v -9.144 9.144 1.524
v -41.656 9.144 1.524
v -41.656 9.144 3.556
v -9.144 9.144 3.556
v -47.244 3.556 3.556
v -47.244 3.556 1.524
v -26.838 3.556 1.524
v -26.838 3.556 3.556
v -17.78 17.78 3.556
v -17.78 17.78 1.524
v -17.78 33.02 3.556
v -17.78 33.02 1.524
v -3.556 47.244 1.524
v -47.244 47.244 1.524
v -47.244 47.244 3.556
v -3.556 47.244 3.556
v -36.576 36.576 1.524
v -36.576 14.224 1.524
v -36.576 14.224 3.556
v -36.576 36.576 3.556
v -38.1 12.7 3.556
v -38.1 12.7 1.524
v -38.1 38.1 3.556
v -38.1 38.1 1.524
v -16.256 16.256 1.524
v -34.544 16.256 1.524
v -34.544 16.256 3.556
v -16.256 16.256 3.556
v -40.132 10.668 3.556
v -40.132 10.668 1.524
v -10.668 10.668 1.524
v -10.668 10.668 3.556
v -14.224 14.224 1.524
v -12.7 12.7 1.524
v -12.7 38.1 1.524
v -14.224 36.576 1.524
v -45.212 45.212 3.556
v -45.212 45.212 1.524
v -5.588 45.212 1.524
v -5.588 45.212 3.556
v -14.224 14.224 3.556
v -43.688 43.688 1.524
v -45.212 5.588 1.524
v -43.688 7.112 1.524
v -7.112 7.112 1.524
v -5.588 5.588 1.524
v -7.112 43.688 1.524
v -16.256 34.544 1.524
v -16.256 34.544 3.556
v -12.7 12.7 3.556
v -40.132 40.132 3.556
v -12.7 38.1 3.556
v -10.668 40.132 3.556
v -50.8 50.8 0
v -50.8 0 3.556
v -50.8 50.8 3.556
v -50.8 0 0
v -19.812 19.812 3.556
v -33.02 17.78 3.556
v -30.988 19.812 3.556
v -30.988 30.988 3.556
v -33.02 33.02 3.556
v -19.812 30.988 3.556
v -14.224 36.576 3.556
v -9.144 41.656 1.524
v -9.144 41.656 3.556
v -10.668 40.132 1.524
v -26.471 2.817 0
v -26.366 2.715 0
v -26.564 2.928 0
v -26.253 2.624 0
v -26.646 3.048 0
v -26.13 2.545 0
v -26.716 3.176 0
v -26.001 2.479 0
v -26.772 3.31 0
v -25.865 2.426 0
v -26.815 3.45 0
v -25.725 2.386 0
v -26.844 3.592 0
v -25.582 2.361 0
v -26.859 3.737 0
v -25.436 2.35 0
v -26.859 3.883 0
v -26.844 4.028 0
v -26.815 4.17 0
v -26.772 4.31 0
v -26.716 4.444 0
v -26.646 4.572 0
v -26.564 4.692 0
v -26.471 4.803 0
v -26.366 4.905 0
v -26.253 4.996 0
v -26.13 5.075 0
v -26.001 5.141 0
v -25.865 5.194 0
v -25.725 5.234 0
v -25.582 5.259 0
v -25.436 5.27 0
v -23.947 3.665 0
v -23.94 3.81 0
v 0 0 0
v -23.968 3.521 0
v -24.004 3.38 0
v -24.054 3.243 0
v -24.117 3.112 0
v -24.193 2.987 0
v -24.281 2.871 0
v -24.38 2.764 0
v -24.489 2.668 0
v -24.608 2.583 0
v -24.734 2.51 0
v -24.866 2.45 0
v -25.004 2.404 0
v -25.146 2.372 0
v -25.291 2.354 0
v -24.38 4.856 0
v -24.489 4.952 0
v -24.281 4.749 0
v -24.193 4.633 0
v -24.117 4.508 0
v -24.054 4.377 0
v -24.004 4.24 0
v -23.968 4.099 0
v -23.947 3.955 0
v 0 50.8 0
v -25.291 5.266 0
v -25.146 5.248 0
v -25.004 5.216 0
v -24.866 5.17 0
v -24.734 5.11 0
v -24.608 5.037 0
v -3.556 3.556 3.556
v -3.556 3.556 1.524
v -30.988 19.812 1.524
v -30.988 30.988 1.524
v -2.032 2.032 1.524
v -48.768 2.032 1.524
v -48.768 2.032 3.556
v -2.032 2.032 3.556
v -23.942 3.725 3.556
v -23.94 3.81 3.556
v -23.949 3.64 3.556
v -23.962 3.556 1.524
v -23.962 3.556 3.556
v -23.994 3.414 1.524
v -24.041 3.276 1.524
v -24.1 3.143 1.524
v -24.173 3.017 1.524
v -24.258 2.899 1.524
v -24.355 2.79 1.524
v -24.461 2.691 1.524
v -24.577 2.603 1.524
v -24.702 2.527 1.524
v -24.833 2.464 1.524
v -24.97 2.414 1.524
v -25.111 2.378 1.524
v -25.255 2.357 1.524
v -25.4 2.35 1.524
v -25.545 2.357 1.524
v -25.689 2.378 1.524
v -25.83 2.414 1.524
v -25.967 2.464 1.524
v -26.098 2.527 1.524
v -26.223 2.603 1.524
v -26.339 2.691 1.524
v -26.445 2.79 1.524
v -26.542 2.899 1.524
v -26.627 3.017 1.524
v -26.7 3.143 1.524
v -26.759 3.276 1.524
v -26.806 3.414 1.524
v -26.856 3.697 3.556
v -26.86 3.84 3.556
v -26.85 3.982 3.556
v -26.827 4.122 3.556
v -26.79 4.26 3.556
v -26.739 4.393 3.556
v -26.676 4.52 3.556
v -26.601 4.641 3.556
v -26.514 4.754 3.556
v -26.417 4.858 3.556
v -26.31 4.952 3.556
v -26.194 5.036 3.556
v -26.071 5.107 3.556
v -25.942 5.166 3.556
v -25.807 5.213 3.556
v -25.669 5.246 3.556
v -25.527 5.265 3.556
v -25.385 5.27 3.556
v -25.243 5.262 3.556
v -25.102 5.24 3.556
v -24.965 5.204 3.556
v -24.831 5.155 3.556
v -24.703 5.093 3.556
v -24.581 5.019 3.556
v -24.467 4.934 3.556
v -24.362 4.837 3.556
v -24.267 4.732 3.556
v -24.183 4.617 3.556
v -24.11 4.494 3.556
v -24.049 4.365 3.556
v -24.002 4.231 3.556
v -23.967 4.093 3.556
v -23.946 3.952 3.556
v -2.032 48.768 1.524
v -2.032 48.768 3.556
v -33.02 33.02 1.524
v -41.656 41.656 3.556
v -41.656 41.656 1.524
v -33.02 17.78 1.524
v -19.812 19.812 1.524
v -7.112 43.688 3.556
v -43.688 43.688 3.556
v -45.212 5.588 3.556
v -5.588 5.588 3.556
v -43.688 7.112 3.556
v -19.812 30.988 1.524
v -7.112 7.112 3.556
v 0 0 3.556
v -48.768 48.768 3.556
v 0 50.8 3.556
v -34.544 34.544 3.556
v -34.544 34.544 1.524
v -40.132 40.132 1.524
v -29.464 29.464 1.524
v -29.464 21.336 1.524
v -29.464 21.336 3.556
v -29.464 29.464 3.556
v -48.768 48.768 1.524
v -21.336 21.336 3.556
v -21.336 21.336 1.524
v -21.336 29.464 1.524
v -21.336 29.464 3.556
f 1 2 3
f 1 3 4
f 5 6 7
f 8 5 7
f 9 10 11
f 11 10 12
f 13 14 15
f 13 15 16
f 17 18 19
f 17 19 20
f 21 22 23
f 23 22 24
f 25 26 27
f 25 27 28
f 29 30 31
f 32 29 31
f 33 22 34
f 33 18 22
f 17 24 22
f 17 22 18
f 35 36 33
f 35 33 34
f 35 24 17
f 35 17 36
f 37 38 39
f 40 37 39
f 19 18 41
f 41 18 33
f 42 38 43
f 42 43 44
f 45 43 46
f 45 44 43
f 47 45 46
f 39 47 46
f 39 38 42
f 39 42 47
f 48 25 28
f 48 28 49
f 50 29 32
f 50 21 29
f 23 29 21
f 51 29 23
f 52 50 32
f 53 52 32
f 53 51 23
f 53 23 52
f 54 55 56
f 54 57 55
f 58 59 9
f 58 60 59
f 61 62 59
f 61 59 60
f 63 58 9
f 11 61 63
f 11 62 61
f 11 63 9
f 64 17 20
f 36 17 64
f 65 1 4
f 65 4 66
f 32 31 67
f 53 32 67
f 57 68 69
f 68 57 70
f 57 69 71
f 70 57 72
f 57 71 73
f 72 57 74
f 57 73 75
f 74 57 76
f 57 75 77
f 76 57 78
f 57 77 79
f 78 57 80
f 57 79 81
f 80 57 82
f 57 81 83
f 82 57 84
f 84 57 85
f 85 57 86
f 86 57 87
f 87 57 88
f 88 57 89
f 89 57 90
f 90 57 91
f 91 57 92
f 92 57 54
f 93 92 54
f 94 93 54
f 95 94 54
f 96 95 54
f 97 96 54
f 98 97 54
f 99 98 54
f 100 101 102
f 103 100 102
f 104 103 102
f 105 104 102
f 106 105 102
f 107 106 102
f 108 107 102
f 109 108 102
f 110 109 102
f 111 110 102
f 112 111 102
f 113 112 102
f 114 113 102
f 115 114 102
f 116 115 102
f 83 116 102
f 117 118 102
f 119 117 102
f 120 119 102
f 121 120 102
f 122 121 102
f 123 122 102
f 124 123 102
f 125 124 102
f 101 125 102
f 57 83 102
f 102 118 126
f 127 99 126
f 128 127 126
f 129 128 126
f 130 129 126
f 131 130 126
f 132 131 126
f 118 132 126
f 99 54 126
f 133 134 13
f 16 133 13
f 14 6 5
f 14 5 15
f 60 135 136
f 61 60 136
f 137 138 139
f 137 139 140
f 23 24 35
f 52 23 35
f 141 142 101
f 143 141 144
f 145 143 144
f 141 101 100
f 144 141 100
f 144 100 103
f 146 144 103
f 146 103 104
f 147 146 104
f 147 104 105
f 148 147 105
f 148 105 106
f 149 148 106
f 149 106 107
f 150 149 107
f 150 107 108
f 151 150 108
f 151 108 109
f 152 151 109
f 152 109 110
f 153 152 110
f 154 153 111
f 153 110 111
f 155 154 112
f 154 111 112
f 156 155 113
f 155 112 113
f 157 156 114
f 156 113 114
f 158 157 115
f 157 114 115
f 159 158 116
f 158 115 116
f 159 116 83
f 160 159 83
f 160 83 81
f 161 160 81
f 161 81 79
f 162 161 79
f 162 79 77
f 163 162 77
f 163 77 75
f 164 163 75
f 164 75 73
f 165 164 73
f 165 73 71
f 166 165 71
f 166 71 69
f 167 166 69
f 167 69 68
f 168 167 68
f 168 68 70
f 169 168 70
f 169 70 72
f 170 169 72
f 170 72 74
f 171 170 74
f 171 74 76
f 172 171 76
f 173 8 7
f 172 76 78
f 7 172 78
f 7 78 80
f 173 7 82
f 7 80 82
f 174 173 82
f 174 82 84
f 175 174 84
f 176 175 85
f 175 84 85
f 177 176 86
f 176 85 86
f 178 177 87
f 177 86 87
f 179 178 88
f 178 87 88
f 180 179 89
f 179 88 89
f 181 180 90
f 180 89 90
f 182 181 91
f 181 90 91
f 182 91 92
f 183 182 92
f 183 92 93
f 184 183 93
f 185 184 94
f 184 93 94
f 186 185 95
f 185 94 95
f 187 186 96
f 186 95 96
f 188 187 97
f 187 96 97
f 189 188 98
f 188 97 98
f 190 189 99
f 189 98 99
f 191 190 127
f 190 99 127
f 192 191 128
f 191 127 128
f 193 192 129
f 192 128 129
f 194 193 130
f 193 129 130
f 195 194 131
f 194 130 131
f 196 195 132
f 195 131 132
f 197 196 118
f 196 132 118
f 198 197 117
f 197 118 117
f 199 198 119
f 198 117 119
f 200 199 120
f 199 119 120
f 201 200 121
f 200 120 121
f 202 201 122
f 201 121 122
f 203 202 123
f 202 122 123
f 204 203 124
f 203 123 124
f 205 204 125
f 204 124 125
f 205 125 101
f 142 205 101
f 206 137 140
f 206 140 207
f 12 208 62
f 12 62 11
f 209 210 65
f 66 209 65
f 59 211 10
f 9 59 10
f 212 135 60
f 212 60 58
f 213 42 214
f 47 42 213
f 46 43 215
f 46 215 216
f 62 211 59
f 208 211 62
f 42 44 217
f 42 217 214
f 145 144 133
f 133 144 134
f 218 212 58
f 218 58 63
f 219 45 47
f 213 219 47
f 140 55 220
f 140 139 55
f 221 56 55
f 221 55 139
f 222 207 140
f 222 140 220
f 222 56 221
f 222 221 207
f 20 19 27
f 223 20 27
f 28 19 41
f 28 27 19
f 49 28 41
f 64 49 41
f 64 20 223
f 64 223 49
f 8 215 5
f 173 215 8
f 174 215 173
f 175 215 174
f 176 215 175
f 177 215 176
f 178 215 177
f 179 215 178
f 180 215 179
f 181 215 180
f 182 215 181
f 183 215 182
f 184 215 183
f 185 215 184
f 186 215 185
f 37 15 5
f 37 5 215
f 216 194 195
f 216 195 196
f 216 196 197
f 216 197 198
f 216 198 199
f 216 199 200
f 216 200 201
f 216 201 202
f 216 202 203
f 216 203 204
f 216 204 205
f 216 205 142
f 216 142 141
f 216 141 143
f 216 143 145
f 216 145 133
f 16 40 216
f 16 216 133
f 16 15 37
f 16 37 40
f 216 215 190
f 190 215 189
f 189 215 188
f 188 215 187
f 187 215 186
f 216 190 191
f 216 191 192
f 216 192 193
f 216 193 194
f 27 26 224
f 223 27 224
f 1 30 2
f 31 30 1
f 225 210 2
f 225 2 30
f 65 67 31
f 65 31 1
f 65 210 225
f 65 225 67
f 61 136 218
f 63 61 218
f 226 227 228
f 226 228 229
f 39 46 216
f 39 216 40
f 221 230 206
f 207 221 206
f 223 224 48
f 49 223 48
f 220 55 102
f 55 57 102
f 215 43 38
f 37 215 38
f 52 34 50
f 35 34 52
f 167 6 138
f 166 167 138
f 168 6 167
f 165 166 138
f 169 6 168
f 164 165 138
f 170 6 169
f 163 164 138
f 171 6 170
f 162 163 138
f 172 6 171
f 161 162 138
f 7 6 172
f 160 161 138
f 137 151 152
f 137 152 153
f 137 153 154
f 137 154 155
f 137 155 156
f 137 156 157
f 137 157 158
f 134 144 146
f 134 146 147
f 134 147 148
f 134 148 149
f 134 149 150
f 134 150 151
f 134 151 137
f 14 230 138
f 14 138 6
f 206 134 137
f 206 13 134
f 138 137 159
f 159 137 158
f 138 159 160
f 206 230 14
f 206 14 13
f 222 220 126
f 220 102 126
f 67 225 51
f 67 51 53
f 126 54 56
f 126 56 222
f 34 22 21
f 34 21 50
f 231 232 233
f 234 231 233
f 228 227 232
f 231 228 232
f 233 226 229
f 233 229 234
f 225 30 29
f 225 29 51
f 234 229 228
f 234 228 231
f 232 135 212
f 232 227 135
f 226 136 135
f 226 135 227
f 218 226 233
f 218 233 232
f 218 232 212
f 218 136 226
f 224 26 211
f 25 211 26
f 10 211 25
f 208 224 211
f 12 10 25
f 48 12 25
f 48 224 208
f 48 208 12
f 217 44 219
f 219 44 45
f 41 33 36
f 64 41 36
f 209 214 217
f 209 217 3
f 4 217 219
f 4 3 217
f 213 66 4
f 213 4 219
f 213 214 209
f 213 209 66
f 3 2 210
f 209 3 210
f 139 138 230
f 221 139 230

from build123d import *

# Parameters (mm, degrees)
F0_W     = 50.8
F0_H     = 50.8
F1_DEPTH = 1.524
F2_W     = 50.8
F2_H     = 50.8
F2_W_2   = 46.736
F2_H_2   = 46.736
F2_W_3   = 43.688
F2_H_3   = 43.688
F2_W_4   = 39.624
F2_H_4   = 39.624
F2_W_5   = 36.576
F2_H_5   = 36.576
F2_W_6   = 32.512
F2_H_6   = 32.512
F2_W_7   = 29.464
F2_H_7   = 29.464
F2_W_8   = 25.4
F2_H_8   = 25.4
F2_W_9   = 22.352
F2_H_9   = 22.352
F2_W_10  = 18.288
F2_H_10  = 18.288
F2_W_11  = 15.24
F2_H_11  = 15.24
F2_W_12  = 11.176
F2_H_12  = 11.176
F2_W_13  = 8.128
F2_H_13  = 8.128
F3_DEPTH = 2.032
F4_R     = 1.4605
F5_DEPTH = 25.4


with BuildPart() as f1:
    # F0 (on Top) → F1 (new body)
    with BuildSketch(Plane.XY):
        with Locations((-25.4, 25.4)):
            Rectangle(F0_W, F0_H)
    extrude(amount=F1_DEPTH)

    # F2 (on face) → F3 (join)
    with BuildSketch(Plane.XY.offset(1.524)):
        with Locations((-25.4, 25.4)):
            Rectangle(F2_W, F2_H)
        with Locations((-25.4, 25.4)):
            Rectangle(F2_W_2, F2_H_2, mode=Mode.SUBTRACT)
        with Locations((-25.4, 25.4)):
            Rectangle(F2_W_3, F2_H_3)
        with Locations((-25.4, 25.4)):
            Rectangle(F2_W_4, F2_H_4, mode=Mode.SUBTRACT)
        with Locations((-25.4, 25.4)):
            Rectangle(F2_W_5, F2_H_5)
        with Locations((-25.4, 25.4)):
            Rectangle(F2_W_6, F2_H_6, mode=Mode.SUBTRACT)
        with Locations((-25.4, 25.4)):
            Rectangle(F2_W_7, F2_H_7)
        with Locations((-25.4, 25.4)):
            Rectangle(F2_W_8, F2_H_8, mode=Mode.SUBTRACT)
        with Locations((-25.4, 25.4)):
            Rectangle(F2_W_9, F2_H_9)
        with Locations((-25.4, 25.4)):
            Rectangle(F2_W_10, F2_H_10, mode=Mode.SUBTRACT)
        with Locations((-25.4, 25.4)):
            Rectangle(F2_W_11, F2_H_11)
        with Locations((-25.4, 25.4)):
            Rectangle(F2_W_12, F2_H_12, mode=Mode.SUBTRACT)
        with Locations((-25.4, 25.4)):
            Rectangle(F2_W_13, F2_H_13)
    extrude(amount=F3_DEPTH)

    # F4 (on face) → F5 (cut)
    with BuildSketch(Plane(origin=(0, 0, 0), x_dir=(1, 0, 0), z_dir=(0, 0, -1))):
        with Locations((-25.4, -3.81)):
            Circle(F4_R)
    extrude(amount=-F5_DEPTH, mode=Mode.SUBTRACT)


solid = f1.part
